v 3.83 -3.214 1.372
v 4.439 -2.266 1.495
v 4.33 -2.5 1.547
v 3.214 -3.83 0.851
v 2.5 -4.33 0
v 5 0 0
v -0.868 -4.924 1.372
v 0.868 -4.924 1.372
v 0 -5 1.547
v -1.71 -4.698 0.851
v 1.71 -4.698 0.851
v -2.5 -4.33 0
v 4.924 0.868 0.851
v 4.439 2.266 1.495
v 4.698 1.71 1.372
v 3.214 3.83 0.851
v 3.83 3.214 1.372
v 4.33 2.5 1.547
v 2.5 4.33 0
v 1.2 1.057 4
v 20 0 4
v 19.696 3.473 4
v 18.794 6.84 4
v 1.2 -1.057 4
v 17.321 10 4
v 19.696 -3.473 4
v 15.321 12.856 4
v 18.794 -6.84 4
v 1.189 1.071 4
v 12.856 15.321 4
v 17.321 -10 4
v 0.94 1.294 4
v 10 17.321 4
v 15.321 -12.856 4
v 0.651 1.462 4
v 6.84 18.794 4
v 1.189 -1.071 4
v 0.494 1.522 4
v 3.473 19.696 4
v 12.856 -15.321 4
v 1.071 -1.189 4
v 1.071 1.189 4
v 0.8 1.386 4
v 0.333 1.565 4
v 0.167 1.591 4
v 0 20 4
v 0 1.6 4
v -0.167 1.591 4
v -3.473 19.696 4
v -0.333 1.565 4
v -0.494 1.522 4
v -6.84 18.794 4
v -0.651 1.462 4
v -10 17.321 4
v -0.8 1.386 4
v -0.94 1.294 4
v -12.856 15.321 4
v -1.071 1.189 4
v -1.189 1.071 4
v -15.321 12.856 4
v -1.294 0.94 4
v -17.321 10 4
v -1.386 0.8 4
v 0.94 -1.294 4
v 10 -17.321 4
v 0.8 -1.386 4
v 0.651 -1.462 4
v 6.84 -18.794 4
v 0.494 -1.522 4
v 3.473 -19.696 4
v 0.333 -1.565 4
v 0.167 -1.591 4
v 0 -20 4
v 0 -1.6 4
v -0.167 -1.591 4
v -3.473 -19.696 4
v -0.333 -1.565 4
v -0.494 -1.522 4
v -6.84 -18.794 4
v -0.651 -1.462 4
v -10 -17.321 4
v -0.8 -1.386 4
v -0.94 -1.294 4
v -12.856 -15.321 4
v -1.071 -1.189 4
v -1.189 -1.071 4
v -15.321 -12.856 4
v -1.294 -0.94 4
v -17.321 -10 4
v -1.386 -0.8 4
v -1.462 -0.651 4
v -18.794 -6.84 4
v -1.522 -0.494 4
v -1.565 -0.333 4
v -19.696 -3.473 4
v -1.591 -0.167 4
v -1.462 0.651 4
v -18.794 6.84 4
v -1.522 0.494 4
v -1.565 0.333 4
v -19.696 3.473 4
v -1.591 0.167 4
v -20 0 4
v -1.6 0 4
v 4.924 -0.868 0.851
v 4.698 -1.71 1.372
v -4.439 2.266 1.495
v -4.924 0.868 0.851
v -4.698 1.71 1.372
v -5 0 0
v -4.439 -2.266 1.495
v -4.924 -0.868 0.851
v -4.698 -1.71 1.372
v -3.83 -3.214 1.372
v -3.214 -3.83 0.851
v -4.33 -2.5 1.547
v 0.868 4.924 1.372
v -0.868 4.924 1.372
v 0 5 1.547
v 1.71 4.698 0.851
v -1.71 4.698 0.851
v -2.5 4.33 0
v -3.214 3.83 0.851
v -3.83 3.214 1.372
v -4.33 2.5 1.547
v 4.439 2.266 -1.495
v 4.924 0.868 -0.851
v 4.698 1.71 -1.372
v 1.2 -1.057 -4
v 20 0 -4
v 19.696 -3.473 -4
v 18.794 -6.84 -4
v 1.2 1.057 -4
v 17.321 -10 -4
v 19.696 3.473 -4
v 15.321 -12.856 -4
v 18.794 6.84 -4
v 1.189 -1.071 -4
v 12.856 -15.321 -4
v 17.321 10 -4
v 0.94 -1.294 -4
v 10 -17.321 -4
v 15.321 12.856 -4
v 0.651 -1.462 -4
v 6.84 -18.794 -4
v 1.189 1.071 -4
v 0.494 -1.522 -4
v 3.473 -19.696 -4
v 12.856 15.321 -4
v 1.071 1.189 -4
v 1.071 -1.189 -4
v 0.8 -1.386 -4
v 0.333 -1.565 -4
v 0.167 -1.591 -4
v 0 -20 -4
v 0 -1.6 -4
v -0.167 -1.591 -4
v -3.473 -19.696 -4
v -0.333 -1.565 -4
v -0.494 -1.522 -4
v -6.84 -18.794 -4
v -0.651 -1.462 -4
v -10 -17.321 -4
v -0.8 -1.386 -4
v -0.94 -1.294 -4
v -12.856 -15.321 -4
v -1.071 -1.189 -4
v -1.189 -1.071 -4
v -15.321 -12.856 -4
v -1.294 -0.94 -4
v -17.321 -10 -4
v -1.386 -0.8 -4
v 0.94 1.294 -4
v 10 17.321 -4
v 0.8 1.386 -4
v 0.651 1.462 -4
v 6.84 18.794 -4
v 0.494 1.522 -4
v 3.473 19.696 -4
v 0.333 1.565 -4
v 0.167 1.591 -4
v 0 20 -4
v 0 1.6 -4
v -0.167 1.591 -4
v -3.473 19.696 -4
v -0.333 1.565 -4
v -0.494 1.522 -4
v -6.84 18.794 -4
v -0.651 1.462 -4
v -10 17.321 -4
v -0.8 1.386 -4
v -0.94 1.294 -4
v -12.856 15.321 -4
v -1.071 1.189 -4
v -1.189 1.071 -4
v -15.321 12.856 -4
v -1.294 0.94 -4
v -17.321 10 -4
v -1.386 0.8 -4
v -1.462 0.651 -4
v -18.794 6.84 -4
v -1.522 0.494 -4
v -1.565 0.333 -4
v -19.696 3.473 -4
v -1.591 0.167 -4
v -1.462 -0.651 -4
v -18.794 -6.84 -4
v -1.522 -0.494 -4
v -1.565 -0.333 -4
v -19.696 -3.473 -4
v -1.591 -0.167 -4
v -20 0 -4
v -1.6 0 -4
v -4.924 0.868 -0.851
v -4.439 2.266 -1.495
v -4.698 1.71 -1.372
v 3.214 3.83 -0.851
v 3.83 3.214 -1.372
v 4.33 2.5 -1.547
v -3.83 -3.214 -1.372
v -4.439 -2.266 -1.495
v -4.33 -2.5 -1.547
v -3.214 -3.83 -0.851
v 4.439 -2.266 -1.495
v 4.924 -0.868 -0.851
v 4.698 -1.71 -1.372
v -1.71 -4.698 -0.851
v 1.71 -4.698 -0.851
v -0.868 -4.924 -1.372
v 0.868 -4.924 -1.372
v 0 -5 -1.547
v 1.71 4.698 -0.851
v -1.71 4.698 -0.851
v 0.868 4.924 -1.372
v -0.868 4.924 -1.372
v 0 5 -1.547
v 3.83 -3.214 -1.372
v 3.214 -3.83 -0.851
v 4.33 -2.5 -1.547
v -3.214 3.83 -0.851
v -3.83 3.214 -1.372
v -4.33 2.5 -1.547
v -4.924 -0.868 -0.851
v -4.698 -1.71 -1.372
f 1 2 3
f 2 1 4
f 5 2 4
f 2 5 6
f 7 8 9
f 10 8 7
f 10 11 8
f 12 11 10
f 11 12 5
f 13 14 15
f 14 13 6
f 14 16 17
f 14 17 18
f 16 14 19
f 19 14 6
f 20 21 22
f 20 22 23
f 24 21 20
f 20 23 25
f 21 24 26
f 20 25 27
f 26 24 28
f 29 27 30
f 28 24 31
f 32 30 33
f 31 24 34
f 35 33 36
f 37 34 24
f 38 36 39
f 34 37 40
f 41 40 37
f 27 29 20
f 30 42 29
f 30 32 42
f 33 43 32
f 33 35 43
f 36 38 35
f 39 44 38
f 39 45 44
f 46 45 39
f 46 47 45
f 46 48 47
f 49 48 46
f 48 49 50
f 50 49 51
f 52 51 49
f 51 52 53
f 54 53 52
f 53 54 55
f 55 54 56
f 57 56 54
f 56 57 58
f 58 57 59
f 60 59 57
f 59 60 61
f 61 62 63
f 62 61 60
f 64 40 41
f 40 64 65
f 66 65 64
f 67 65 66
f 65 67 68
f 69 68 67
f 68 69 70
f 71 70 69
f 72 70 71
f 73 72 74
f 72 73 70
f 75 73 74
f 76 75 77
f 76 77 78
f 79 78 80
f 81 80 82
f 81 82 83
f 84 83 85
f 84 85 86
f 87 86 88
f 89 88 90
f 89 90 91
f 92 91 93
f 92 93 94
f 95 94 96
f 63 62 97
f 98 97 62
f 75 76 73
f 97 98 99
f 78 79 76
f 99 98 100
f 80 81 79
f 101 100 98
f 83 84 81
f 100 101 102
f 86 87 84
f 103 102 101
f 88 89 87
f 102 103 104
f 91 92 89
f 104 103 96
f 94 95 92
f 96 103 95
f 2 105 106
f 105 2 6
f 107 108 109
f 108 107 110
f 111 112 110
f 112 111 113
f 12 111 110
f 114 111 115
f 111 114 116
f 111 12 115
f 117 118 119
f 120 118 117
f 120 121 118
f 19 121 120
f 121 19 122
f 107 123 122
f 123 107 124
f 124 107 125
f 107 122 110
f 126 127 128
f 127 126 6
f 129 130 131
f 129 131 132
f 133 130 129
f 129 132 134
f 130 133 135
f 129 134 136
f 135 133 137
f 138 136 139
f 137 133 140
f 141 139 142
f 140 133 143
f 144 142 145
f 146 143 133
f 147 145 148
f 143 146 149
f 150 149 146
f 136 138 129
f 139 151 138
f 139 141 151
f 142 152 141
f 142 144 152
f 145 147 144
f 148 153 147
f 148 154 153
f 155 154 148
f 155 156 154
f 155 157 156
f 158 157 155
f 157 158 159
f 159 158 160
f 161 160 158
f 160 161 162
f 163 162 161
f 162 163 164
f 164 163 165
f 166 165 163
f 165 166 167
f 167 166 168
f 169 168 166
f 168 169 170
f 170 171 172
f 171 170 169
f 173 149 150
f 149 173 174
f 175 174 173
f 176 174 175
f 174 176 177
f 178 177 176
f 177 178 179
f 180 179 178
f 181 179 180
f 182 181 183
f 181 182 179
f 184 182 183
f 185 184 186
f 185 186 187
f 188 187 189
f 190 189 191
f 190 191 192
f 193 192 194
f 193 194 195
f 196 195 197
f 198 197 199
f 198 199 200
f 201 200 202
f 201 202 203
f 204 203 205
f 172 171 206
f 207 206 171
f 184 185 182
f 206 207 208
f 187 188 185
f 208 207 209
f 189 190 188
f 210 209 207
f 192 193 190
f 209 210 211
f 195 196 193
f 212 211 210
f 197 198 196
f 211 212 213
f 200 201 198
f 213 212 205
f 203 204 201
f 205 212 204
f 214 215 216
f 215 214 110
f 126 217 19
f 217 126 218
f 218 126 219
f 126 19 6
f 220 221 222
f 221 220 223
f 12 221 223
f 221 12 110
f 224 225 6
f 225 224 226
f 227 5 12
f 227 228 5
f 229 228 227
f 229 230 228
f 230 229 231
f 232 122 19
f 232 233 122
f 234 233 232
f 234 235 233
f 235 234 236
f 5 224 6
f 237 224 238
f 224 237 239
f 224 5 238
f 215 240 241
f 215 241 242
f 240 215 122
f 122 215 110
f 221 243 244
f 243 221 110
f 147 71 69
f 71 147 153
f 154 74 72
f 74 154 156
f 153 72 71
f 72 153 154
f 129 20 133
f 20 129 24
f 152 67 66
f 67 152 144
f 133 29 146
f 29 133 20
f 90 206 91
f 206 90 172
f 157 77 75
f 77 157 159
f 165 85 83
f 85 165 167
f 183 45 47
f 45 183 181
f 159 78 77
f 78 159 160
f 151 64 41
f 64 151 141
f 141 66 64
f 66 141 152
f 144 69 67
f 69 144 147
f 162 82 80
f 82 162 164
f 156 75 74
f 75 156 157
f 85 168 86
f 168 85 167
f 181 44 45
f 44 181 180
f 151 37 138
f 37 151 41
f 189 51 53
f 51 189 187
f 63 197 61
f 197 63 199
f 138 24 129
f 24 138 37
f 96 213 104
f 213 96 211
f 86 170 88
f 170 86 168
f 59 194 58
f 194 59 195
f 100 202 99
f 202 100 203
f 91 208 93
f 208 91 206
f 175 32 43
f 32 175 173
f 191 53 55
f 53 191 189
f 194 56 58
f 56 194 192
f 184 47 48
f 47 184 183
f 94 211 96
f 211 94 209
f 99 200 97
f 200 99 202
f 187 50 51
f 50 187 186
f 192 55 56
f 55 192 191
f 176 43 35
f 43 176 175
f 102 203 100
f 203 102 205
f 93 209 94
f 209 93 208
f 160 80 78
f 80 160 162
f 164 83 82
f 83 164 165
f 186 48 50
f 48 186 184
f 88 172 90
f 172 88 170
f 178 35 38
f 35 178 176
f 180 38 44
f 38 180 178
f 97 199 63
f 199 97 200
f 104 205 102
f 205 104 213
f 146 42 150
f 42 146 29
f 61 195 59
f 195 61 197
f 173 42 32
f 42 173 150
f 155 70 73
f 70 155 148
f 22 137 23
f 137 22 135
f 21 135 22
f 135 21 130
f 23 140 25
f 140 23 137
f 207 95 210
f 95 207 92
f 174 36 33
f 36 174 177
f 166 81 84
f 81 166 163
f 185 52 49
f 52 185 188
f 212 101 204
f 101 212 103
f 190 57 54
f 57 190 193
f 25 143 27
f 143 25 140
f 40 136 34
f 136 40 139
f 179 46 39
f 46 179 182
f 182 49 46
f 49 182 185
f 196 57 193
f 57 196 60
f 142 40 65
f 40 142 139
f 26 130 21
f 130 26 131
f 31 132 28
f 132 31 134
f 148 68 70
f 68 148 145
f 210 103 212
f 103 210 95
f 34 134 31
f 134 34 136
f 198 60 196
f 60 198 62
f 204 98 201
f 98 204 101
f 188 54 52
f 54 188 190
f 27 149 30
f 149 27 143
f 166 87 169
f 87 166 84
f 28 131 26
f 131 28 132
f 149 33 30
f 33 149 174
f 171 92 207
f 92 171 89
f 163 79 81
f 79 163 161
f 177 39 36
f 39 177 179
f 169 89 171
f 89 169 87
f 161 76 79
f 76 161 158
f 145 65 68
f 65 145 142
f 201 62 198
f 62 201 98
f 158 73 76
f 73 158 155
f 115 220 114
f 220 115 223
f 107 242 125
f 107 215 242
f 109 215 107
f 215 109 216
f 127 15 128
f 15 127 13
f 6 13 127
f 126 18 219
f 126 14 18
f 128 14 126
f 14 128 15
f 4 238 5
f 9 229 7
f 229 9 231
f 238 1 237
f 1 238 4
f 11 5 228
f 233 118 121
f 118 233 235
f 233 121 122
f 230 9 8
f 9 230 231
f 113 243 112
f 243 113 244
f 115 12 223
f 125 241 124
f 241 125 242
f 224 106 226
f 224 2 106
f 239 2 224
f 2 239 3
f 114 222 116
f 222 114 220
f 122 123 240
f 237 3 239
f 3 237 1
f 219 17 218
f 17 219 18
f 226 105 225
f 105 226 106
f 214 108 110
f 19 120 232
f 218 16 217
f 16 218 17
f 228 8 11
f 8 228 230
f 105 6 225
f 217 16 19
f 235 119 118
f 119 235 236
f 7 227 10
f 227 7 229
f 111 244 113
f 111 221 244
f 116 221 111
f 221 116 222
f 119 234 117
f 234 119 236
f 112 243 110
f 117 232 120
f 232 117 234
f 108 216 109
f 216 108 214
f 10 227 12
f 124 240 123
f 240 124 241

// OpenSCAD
/* [Rendering] */
// Higher makes smoother circles. Use roughly 2x diameter for smooth prints.
$fn = 36; // *4 for final)

// Build outwards from the motor
overlap = 0.001;

// DC N20 motor dimensions
silver_height = 10;
silver_width = 12;
silver_depth = 27;


// SHAFT SETTINGS
// ------------------------------------------
// Measured diameter of your motor shaft (usually 3mm)
shaft_diameter = 3.0; 

// The "D" thickness (Distance from flat surface to opposite curved wall)
// For a 3mm shaft, this is usually 2.5mm. Measure yours with calipers!
shaft_flat_thickness = 2.5; 

// Printing Tolerance (Crucial!)
// 0.15mm - 0.2mm is usually good for a snug press fit.
fit_tolerance = 0.2;

shaft_length = 8;
//https://botland.store/n20-micro-motors-mp-series-medium-power/12606-micro-motor-n20-bt44-250-1-90rpm-6v-5904422306731.html

// Weel sections, all from center
press_fit_r = 6;
squish_r = 20;
paddle = squish_r + 10;

nozzle_diameter = 0.4;
wall_thickness = nozzle_diameter * 3;
num_vanes = 36; // Increased slightly to ensure smooth rolling on the tips
vane_thickness = 2*nozzle_diameter; 

// Controls the "V" shape on the tread (Ground smoothness)
chevron_angle = 35; 

// Controls the "Lean" of the soft (Torque Stiffness)
// 15-20 degrees is usually enough. Too high and it gets too stiff vertically.
truss_angle = 55; 


module zmirror(){
    children();
    mirror([0,0,1])
	children();
}

// 2. The D-Shaft Cutout (SUBTRACT)
module DShaft() {
    color("silver")
    translate([0,0, -shaft_length/2 - overlap]) // Center the cut vertically
    linear_extrude(height=shaft_length + overlap*2) {
        intersection() {
            // A. The Round Shaft
            circle(d = shaft_diameter + fit_tolerance, $fn=60);
            
            // B. The Flat Cut (The D-shape)
            // We draw a large square shifted to create the flat edge
            translate([ -shaft_diameter, -shaft_diameter ]) 
                square([ (shaft_flat_thickness + fit_tolerance) + shaft_diameter/2, shaft_diameter*2 ]);
        }
    }
}

// Motor block
*color("silver")
translate([0,0,-24/2 - shaft_length/2])
cube([10,12,24], center=true);

// Hard press-fit center
module PressFit_00() {
    color("FireBrick")
    difference() {
        intersection() {
            cylinder(h=shaft_length, r=press_fit_r, center=true, $fn=6);
            zmirror() {
                cylinder(h=shaft_length/2, r1=press_fit_r-1, r2=press_fit_r + 1, $fn=6);
            }
        }
        DShaft();
    }
}

PressFit_00();

difference() {
cylinder(h=shaft_length, r=squish_r, center=true);
cylinder(h=shaft_length+overlap*2, r=press_fit_r-1, center=true);
PressFit_00();
}
